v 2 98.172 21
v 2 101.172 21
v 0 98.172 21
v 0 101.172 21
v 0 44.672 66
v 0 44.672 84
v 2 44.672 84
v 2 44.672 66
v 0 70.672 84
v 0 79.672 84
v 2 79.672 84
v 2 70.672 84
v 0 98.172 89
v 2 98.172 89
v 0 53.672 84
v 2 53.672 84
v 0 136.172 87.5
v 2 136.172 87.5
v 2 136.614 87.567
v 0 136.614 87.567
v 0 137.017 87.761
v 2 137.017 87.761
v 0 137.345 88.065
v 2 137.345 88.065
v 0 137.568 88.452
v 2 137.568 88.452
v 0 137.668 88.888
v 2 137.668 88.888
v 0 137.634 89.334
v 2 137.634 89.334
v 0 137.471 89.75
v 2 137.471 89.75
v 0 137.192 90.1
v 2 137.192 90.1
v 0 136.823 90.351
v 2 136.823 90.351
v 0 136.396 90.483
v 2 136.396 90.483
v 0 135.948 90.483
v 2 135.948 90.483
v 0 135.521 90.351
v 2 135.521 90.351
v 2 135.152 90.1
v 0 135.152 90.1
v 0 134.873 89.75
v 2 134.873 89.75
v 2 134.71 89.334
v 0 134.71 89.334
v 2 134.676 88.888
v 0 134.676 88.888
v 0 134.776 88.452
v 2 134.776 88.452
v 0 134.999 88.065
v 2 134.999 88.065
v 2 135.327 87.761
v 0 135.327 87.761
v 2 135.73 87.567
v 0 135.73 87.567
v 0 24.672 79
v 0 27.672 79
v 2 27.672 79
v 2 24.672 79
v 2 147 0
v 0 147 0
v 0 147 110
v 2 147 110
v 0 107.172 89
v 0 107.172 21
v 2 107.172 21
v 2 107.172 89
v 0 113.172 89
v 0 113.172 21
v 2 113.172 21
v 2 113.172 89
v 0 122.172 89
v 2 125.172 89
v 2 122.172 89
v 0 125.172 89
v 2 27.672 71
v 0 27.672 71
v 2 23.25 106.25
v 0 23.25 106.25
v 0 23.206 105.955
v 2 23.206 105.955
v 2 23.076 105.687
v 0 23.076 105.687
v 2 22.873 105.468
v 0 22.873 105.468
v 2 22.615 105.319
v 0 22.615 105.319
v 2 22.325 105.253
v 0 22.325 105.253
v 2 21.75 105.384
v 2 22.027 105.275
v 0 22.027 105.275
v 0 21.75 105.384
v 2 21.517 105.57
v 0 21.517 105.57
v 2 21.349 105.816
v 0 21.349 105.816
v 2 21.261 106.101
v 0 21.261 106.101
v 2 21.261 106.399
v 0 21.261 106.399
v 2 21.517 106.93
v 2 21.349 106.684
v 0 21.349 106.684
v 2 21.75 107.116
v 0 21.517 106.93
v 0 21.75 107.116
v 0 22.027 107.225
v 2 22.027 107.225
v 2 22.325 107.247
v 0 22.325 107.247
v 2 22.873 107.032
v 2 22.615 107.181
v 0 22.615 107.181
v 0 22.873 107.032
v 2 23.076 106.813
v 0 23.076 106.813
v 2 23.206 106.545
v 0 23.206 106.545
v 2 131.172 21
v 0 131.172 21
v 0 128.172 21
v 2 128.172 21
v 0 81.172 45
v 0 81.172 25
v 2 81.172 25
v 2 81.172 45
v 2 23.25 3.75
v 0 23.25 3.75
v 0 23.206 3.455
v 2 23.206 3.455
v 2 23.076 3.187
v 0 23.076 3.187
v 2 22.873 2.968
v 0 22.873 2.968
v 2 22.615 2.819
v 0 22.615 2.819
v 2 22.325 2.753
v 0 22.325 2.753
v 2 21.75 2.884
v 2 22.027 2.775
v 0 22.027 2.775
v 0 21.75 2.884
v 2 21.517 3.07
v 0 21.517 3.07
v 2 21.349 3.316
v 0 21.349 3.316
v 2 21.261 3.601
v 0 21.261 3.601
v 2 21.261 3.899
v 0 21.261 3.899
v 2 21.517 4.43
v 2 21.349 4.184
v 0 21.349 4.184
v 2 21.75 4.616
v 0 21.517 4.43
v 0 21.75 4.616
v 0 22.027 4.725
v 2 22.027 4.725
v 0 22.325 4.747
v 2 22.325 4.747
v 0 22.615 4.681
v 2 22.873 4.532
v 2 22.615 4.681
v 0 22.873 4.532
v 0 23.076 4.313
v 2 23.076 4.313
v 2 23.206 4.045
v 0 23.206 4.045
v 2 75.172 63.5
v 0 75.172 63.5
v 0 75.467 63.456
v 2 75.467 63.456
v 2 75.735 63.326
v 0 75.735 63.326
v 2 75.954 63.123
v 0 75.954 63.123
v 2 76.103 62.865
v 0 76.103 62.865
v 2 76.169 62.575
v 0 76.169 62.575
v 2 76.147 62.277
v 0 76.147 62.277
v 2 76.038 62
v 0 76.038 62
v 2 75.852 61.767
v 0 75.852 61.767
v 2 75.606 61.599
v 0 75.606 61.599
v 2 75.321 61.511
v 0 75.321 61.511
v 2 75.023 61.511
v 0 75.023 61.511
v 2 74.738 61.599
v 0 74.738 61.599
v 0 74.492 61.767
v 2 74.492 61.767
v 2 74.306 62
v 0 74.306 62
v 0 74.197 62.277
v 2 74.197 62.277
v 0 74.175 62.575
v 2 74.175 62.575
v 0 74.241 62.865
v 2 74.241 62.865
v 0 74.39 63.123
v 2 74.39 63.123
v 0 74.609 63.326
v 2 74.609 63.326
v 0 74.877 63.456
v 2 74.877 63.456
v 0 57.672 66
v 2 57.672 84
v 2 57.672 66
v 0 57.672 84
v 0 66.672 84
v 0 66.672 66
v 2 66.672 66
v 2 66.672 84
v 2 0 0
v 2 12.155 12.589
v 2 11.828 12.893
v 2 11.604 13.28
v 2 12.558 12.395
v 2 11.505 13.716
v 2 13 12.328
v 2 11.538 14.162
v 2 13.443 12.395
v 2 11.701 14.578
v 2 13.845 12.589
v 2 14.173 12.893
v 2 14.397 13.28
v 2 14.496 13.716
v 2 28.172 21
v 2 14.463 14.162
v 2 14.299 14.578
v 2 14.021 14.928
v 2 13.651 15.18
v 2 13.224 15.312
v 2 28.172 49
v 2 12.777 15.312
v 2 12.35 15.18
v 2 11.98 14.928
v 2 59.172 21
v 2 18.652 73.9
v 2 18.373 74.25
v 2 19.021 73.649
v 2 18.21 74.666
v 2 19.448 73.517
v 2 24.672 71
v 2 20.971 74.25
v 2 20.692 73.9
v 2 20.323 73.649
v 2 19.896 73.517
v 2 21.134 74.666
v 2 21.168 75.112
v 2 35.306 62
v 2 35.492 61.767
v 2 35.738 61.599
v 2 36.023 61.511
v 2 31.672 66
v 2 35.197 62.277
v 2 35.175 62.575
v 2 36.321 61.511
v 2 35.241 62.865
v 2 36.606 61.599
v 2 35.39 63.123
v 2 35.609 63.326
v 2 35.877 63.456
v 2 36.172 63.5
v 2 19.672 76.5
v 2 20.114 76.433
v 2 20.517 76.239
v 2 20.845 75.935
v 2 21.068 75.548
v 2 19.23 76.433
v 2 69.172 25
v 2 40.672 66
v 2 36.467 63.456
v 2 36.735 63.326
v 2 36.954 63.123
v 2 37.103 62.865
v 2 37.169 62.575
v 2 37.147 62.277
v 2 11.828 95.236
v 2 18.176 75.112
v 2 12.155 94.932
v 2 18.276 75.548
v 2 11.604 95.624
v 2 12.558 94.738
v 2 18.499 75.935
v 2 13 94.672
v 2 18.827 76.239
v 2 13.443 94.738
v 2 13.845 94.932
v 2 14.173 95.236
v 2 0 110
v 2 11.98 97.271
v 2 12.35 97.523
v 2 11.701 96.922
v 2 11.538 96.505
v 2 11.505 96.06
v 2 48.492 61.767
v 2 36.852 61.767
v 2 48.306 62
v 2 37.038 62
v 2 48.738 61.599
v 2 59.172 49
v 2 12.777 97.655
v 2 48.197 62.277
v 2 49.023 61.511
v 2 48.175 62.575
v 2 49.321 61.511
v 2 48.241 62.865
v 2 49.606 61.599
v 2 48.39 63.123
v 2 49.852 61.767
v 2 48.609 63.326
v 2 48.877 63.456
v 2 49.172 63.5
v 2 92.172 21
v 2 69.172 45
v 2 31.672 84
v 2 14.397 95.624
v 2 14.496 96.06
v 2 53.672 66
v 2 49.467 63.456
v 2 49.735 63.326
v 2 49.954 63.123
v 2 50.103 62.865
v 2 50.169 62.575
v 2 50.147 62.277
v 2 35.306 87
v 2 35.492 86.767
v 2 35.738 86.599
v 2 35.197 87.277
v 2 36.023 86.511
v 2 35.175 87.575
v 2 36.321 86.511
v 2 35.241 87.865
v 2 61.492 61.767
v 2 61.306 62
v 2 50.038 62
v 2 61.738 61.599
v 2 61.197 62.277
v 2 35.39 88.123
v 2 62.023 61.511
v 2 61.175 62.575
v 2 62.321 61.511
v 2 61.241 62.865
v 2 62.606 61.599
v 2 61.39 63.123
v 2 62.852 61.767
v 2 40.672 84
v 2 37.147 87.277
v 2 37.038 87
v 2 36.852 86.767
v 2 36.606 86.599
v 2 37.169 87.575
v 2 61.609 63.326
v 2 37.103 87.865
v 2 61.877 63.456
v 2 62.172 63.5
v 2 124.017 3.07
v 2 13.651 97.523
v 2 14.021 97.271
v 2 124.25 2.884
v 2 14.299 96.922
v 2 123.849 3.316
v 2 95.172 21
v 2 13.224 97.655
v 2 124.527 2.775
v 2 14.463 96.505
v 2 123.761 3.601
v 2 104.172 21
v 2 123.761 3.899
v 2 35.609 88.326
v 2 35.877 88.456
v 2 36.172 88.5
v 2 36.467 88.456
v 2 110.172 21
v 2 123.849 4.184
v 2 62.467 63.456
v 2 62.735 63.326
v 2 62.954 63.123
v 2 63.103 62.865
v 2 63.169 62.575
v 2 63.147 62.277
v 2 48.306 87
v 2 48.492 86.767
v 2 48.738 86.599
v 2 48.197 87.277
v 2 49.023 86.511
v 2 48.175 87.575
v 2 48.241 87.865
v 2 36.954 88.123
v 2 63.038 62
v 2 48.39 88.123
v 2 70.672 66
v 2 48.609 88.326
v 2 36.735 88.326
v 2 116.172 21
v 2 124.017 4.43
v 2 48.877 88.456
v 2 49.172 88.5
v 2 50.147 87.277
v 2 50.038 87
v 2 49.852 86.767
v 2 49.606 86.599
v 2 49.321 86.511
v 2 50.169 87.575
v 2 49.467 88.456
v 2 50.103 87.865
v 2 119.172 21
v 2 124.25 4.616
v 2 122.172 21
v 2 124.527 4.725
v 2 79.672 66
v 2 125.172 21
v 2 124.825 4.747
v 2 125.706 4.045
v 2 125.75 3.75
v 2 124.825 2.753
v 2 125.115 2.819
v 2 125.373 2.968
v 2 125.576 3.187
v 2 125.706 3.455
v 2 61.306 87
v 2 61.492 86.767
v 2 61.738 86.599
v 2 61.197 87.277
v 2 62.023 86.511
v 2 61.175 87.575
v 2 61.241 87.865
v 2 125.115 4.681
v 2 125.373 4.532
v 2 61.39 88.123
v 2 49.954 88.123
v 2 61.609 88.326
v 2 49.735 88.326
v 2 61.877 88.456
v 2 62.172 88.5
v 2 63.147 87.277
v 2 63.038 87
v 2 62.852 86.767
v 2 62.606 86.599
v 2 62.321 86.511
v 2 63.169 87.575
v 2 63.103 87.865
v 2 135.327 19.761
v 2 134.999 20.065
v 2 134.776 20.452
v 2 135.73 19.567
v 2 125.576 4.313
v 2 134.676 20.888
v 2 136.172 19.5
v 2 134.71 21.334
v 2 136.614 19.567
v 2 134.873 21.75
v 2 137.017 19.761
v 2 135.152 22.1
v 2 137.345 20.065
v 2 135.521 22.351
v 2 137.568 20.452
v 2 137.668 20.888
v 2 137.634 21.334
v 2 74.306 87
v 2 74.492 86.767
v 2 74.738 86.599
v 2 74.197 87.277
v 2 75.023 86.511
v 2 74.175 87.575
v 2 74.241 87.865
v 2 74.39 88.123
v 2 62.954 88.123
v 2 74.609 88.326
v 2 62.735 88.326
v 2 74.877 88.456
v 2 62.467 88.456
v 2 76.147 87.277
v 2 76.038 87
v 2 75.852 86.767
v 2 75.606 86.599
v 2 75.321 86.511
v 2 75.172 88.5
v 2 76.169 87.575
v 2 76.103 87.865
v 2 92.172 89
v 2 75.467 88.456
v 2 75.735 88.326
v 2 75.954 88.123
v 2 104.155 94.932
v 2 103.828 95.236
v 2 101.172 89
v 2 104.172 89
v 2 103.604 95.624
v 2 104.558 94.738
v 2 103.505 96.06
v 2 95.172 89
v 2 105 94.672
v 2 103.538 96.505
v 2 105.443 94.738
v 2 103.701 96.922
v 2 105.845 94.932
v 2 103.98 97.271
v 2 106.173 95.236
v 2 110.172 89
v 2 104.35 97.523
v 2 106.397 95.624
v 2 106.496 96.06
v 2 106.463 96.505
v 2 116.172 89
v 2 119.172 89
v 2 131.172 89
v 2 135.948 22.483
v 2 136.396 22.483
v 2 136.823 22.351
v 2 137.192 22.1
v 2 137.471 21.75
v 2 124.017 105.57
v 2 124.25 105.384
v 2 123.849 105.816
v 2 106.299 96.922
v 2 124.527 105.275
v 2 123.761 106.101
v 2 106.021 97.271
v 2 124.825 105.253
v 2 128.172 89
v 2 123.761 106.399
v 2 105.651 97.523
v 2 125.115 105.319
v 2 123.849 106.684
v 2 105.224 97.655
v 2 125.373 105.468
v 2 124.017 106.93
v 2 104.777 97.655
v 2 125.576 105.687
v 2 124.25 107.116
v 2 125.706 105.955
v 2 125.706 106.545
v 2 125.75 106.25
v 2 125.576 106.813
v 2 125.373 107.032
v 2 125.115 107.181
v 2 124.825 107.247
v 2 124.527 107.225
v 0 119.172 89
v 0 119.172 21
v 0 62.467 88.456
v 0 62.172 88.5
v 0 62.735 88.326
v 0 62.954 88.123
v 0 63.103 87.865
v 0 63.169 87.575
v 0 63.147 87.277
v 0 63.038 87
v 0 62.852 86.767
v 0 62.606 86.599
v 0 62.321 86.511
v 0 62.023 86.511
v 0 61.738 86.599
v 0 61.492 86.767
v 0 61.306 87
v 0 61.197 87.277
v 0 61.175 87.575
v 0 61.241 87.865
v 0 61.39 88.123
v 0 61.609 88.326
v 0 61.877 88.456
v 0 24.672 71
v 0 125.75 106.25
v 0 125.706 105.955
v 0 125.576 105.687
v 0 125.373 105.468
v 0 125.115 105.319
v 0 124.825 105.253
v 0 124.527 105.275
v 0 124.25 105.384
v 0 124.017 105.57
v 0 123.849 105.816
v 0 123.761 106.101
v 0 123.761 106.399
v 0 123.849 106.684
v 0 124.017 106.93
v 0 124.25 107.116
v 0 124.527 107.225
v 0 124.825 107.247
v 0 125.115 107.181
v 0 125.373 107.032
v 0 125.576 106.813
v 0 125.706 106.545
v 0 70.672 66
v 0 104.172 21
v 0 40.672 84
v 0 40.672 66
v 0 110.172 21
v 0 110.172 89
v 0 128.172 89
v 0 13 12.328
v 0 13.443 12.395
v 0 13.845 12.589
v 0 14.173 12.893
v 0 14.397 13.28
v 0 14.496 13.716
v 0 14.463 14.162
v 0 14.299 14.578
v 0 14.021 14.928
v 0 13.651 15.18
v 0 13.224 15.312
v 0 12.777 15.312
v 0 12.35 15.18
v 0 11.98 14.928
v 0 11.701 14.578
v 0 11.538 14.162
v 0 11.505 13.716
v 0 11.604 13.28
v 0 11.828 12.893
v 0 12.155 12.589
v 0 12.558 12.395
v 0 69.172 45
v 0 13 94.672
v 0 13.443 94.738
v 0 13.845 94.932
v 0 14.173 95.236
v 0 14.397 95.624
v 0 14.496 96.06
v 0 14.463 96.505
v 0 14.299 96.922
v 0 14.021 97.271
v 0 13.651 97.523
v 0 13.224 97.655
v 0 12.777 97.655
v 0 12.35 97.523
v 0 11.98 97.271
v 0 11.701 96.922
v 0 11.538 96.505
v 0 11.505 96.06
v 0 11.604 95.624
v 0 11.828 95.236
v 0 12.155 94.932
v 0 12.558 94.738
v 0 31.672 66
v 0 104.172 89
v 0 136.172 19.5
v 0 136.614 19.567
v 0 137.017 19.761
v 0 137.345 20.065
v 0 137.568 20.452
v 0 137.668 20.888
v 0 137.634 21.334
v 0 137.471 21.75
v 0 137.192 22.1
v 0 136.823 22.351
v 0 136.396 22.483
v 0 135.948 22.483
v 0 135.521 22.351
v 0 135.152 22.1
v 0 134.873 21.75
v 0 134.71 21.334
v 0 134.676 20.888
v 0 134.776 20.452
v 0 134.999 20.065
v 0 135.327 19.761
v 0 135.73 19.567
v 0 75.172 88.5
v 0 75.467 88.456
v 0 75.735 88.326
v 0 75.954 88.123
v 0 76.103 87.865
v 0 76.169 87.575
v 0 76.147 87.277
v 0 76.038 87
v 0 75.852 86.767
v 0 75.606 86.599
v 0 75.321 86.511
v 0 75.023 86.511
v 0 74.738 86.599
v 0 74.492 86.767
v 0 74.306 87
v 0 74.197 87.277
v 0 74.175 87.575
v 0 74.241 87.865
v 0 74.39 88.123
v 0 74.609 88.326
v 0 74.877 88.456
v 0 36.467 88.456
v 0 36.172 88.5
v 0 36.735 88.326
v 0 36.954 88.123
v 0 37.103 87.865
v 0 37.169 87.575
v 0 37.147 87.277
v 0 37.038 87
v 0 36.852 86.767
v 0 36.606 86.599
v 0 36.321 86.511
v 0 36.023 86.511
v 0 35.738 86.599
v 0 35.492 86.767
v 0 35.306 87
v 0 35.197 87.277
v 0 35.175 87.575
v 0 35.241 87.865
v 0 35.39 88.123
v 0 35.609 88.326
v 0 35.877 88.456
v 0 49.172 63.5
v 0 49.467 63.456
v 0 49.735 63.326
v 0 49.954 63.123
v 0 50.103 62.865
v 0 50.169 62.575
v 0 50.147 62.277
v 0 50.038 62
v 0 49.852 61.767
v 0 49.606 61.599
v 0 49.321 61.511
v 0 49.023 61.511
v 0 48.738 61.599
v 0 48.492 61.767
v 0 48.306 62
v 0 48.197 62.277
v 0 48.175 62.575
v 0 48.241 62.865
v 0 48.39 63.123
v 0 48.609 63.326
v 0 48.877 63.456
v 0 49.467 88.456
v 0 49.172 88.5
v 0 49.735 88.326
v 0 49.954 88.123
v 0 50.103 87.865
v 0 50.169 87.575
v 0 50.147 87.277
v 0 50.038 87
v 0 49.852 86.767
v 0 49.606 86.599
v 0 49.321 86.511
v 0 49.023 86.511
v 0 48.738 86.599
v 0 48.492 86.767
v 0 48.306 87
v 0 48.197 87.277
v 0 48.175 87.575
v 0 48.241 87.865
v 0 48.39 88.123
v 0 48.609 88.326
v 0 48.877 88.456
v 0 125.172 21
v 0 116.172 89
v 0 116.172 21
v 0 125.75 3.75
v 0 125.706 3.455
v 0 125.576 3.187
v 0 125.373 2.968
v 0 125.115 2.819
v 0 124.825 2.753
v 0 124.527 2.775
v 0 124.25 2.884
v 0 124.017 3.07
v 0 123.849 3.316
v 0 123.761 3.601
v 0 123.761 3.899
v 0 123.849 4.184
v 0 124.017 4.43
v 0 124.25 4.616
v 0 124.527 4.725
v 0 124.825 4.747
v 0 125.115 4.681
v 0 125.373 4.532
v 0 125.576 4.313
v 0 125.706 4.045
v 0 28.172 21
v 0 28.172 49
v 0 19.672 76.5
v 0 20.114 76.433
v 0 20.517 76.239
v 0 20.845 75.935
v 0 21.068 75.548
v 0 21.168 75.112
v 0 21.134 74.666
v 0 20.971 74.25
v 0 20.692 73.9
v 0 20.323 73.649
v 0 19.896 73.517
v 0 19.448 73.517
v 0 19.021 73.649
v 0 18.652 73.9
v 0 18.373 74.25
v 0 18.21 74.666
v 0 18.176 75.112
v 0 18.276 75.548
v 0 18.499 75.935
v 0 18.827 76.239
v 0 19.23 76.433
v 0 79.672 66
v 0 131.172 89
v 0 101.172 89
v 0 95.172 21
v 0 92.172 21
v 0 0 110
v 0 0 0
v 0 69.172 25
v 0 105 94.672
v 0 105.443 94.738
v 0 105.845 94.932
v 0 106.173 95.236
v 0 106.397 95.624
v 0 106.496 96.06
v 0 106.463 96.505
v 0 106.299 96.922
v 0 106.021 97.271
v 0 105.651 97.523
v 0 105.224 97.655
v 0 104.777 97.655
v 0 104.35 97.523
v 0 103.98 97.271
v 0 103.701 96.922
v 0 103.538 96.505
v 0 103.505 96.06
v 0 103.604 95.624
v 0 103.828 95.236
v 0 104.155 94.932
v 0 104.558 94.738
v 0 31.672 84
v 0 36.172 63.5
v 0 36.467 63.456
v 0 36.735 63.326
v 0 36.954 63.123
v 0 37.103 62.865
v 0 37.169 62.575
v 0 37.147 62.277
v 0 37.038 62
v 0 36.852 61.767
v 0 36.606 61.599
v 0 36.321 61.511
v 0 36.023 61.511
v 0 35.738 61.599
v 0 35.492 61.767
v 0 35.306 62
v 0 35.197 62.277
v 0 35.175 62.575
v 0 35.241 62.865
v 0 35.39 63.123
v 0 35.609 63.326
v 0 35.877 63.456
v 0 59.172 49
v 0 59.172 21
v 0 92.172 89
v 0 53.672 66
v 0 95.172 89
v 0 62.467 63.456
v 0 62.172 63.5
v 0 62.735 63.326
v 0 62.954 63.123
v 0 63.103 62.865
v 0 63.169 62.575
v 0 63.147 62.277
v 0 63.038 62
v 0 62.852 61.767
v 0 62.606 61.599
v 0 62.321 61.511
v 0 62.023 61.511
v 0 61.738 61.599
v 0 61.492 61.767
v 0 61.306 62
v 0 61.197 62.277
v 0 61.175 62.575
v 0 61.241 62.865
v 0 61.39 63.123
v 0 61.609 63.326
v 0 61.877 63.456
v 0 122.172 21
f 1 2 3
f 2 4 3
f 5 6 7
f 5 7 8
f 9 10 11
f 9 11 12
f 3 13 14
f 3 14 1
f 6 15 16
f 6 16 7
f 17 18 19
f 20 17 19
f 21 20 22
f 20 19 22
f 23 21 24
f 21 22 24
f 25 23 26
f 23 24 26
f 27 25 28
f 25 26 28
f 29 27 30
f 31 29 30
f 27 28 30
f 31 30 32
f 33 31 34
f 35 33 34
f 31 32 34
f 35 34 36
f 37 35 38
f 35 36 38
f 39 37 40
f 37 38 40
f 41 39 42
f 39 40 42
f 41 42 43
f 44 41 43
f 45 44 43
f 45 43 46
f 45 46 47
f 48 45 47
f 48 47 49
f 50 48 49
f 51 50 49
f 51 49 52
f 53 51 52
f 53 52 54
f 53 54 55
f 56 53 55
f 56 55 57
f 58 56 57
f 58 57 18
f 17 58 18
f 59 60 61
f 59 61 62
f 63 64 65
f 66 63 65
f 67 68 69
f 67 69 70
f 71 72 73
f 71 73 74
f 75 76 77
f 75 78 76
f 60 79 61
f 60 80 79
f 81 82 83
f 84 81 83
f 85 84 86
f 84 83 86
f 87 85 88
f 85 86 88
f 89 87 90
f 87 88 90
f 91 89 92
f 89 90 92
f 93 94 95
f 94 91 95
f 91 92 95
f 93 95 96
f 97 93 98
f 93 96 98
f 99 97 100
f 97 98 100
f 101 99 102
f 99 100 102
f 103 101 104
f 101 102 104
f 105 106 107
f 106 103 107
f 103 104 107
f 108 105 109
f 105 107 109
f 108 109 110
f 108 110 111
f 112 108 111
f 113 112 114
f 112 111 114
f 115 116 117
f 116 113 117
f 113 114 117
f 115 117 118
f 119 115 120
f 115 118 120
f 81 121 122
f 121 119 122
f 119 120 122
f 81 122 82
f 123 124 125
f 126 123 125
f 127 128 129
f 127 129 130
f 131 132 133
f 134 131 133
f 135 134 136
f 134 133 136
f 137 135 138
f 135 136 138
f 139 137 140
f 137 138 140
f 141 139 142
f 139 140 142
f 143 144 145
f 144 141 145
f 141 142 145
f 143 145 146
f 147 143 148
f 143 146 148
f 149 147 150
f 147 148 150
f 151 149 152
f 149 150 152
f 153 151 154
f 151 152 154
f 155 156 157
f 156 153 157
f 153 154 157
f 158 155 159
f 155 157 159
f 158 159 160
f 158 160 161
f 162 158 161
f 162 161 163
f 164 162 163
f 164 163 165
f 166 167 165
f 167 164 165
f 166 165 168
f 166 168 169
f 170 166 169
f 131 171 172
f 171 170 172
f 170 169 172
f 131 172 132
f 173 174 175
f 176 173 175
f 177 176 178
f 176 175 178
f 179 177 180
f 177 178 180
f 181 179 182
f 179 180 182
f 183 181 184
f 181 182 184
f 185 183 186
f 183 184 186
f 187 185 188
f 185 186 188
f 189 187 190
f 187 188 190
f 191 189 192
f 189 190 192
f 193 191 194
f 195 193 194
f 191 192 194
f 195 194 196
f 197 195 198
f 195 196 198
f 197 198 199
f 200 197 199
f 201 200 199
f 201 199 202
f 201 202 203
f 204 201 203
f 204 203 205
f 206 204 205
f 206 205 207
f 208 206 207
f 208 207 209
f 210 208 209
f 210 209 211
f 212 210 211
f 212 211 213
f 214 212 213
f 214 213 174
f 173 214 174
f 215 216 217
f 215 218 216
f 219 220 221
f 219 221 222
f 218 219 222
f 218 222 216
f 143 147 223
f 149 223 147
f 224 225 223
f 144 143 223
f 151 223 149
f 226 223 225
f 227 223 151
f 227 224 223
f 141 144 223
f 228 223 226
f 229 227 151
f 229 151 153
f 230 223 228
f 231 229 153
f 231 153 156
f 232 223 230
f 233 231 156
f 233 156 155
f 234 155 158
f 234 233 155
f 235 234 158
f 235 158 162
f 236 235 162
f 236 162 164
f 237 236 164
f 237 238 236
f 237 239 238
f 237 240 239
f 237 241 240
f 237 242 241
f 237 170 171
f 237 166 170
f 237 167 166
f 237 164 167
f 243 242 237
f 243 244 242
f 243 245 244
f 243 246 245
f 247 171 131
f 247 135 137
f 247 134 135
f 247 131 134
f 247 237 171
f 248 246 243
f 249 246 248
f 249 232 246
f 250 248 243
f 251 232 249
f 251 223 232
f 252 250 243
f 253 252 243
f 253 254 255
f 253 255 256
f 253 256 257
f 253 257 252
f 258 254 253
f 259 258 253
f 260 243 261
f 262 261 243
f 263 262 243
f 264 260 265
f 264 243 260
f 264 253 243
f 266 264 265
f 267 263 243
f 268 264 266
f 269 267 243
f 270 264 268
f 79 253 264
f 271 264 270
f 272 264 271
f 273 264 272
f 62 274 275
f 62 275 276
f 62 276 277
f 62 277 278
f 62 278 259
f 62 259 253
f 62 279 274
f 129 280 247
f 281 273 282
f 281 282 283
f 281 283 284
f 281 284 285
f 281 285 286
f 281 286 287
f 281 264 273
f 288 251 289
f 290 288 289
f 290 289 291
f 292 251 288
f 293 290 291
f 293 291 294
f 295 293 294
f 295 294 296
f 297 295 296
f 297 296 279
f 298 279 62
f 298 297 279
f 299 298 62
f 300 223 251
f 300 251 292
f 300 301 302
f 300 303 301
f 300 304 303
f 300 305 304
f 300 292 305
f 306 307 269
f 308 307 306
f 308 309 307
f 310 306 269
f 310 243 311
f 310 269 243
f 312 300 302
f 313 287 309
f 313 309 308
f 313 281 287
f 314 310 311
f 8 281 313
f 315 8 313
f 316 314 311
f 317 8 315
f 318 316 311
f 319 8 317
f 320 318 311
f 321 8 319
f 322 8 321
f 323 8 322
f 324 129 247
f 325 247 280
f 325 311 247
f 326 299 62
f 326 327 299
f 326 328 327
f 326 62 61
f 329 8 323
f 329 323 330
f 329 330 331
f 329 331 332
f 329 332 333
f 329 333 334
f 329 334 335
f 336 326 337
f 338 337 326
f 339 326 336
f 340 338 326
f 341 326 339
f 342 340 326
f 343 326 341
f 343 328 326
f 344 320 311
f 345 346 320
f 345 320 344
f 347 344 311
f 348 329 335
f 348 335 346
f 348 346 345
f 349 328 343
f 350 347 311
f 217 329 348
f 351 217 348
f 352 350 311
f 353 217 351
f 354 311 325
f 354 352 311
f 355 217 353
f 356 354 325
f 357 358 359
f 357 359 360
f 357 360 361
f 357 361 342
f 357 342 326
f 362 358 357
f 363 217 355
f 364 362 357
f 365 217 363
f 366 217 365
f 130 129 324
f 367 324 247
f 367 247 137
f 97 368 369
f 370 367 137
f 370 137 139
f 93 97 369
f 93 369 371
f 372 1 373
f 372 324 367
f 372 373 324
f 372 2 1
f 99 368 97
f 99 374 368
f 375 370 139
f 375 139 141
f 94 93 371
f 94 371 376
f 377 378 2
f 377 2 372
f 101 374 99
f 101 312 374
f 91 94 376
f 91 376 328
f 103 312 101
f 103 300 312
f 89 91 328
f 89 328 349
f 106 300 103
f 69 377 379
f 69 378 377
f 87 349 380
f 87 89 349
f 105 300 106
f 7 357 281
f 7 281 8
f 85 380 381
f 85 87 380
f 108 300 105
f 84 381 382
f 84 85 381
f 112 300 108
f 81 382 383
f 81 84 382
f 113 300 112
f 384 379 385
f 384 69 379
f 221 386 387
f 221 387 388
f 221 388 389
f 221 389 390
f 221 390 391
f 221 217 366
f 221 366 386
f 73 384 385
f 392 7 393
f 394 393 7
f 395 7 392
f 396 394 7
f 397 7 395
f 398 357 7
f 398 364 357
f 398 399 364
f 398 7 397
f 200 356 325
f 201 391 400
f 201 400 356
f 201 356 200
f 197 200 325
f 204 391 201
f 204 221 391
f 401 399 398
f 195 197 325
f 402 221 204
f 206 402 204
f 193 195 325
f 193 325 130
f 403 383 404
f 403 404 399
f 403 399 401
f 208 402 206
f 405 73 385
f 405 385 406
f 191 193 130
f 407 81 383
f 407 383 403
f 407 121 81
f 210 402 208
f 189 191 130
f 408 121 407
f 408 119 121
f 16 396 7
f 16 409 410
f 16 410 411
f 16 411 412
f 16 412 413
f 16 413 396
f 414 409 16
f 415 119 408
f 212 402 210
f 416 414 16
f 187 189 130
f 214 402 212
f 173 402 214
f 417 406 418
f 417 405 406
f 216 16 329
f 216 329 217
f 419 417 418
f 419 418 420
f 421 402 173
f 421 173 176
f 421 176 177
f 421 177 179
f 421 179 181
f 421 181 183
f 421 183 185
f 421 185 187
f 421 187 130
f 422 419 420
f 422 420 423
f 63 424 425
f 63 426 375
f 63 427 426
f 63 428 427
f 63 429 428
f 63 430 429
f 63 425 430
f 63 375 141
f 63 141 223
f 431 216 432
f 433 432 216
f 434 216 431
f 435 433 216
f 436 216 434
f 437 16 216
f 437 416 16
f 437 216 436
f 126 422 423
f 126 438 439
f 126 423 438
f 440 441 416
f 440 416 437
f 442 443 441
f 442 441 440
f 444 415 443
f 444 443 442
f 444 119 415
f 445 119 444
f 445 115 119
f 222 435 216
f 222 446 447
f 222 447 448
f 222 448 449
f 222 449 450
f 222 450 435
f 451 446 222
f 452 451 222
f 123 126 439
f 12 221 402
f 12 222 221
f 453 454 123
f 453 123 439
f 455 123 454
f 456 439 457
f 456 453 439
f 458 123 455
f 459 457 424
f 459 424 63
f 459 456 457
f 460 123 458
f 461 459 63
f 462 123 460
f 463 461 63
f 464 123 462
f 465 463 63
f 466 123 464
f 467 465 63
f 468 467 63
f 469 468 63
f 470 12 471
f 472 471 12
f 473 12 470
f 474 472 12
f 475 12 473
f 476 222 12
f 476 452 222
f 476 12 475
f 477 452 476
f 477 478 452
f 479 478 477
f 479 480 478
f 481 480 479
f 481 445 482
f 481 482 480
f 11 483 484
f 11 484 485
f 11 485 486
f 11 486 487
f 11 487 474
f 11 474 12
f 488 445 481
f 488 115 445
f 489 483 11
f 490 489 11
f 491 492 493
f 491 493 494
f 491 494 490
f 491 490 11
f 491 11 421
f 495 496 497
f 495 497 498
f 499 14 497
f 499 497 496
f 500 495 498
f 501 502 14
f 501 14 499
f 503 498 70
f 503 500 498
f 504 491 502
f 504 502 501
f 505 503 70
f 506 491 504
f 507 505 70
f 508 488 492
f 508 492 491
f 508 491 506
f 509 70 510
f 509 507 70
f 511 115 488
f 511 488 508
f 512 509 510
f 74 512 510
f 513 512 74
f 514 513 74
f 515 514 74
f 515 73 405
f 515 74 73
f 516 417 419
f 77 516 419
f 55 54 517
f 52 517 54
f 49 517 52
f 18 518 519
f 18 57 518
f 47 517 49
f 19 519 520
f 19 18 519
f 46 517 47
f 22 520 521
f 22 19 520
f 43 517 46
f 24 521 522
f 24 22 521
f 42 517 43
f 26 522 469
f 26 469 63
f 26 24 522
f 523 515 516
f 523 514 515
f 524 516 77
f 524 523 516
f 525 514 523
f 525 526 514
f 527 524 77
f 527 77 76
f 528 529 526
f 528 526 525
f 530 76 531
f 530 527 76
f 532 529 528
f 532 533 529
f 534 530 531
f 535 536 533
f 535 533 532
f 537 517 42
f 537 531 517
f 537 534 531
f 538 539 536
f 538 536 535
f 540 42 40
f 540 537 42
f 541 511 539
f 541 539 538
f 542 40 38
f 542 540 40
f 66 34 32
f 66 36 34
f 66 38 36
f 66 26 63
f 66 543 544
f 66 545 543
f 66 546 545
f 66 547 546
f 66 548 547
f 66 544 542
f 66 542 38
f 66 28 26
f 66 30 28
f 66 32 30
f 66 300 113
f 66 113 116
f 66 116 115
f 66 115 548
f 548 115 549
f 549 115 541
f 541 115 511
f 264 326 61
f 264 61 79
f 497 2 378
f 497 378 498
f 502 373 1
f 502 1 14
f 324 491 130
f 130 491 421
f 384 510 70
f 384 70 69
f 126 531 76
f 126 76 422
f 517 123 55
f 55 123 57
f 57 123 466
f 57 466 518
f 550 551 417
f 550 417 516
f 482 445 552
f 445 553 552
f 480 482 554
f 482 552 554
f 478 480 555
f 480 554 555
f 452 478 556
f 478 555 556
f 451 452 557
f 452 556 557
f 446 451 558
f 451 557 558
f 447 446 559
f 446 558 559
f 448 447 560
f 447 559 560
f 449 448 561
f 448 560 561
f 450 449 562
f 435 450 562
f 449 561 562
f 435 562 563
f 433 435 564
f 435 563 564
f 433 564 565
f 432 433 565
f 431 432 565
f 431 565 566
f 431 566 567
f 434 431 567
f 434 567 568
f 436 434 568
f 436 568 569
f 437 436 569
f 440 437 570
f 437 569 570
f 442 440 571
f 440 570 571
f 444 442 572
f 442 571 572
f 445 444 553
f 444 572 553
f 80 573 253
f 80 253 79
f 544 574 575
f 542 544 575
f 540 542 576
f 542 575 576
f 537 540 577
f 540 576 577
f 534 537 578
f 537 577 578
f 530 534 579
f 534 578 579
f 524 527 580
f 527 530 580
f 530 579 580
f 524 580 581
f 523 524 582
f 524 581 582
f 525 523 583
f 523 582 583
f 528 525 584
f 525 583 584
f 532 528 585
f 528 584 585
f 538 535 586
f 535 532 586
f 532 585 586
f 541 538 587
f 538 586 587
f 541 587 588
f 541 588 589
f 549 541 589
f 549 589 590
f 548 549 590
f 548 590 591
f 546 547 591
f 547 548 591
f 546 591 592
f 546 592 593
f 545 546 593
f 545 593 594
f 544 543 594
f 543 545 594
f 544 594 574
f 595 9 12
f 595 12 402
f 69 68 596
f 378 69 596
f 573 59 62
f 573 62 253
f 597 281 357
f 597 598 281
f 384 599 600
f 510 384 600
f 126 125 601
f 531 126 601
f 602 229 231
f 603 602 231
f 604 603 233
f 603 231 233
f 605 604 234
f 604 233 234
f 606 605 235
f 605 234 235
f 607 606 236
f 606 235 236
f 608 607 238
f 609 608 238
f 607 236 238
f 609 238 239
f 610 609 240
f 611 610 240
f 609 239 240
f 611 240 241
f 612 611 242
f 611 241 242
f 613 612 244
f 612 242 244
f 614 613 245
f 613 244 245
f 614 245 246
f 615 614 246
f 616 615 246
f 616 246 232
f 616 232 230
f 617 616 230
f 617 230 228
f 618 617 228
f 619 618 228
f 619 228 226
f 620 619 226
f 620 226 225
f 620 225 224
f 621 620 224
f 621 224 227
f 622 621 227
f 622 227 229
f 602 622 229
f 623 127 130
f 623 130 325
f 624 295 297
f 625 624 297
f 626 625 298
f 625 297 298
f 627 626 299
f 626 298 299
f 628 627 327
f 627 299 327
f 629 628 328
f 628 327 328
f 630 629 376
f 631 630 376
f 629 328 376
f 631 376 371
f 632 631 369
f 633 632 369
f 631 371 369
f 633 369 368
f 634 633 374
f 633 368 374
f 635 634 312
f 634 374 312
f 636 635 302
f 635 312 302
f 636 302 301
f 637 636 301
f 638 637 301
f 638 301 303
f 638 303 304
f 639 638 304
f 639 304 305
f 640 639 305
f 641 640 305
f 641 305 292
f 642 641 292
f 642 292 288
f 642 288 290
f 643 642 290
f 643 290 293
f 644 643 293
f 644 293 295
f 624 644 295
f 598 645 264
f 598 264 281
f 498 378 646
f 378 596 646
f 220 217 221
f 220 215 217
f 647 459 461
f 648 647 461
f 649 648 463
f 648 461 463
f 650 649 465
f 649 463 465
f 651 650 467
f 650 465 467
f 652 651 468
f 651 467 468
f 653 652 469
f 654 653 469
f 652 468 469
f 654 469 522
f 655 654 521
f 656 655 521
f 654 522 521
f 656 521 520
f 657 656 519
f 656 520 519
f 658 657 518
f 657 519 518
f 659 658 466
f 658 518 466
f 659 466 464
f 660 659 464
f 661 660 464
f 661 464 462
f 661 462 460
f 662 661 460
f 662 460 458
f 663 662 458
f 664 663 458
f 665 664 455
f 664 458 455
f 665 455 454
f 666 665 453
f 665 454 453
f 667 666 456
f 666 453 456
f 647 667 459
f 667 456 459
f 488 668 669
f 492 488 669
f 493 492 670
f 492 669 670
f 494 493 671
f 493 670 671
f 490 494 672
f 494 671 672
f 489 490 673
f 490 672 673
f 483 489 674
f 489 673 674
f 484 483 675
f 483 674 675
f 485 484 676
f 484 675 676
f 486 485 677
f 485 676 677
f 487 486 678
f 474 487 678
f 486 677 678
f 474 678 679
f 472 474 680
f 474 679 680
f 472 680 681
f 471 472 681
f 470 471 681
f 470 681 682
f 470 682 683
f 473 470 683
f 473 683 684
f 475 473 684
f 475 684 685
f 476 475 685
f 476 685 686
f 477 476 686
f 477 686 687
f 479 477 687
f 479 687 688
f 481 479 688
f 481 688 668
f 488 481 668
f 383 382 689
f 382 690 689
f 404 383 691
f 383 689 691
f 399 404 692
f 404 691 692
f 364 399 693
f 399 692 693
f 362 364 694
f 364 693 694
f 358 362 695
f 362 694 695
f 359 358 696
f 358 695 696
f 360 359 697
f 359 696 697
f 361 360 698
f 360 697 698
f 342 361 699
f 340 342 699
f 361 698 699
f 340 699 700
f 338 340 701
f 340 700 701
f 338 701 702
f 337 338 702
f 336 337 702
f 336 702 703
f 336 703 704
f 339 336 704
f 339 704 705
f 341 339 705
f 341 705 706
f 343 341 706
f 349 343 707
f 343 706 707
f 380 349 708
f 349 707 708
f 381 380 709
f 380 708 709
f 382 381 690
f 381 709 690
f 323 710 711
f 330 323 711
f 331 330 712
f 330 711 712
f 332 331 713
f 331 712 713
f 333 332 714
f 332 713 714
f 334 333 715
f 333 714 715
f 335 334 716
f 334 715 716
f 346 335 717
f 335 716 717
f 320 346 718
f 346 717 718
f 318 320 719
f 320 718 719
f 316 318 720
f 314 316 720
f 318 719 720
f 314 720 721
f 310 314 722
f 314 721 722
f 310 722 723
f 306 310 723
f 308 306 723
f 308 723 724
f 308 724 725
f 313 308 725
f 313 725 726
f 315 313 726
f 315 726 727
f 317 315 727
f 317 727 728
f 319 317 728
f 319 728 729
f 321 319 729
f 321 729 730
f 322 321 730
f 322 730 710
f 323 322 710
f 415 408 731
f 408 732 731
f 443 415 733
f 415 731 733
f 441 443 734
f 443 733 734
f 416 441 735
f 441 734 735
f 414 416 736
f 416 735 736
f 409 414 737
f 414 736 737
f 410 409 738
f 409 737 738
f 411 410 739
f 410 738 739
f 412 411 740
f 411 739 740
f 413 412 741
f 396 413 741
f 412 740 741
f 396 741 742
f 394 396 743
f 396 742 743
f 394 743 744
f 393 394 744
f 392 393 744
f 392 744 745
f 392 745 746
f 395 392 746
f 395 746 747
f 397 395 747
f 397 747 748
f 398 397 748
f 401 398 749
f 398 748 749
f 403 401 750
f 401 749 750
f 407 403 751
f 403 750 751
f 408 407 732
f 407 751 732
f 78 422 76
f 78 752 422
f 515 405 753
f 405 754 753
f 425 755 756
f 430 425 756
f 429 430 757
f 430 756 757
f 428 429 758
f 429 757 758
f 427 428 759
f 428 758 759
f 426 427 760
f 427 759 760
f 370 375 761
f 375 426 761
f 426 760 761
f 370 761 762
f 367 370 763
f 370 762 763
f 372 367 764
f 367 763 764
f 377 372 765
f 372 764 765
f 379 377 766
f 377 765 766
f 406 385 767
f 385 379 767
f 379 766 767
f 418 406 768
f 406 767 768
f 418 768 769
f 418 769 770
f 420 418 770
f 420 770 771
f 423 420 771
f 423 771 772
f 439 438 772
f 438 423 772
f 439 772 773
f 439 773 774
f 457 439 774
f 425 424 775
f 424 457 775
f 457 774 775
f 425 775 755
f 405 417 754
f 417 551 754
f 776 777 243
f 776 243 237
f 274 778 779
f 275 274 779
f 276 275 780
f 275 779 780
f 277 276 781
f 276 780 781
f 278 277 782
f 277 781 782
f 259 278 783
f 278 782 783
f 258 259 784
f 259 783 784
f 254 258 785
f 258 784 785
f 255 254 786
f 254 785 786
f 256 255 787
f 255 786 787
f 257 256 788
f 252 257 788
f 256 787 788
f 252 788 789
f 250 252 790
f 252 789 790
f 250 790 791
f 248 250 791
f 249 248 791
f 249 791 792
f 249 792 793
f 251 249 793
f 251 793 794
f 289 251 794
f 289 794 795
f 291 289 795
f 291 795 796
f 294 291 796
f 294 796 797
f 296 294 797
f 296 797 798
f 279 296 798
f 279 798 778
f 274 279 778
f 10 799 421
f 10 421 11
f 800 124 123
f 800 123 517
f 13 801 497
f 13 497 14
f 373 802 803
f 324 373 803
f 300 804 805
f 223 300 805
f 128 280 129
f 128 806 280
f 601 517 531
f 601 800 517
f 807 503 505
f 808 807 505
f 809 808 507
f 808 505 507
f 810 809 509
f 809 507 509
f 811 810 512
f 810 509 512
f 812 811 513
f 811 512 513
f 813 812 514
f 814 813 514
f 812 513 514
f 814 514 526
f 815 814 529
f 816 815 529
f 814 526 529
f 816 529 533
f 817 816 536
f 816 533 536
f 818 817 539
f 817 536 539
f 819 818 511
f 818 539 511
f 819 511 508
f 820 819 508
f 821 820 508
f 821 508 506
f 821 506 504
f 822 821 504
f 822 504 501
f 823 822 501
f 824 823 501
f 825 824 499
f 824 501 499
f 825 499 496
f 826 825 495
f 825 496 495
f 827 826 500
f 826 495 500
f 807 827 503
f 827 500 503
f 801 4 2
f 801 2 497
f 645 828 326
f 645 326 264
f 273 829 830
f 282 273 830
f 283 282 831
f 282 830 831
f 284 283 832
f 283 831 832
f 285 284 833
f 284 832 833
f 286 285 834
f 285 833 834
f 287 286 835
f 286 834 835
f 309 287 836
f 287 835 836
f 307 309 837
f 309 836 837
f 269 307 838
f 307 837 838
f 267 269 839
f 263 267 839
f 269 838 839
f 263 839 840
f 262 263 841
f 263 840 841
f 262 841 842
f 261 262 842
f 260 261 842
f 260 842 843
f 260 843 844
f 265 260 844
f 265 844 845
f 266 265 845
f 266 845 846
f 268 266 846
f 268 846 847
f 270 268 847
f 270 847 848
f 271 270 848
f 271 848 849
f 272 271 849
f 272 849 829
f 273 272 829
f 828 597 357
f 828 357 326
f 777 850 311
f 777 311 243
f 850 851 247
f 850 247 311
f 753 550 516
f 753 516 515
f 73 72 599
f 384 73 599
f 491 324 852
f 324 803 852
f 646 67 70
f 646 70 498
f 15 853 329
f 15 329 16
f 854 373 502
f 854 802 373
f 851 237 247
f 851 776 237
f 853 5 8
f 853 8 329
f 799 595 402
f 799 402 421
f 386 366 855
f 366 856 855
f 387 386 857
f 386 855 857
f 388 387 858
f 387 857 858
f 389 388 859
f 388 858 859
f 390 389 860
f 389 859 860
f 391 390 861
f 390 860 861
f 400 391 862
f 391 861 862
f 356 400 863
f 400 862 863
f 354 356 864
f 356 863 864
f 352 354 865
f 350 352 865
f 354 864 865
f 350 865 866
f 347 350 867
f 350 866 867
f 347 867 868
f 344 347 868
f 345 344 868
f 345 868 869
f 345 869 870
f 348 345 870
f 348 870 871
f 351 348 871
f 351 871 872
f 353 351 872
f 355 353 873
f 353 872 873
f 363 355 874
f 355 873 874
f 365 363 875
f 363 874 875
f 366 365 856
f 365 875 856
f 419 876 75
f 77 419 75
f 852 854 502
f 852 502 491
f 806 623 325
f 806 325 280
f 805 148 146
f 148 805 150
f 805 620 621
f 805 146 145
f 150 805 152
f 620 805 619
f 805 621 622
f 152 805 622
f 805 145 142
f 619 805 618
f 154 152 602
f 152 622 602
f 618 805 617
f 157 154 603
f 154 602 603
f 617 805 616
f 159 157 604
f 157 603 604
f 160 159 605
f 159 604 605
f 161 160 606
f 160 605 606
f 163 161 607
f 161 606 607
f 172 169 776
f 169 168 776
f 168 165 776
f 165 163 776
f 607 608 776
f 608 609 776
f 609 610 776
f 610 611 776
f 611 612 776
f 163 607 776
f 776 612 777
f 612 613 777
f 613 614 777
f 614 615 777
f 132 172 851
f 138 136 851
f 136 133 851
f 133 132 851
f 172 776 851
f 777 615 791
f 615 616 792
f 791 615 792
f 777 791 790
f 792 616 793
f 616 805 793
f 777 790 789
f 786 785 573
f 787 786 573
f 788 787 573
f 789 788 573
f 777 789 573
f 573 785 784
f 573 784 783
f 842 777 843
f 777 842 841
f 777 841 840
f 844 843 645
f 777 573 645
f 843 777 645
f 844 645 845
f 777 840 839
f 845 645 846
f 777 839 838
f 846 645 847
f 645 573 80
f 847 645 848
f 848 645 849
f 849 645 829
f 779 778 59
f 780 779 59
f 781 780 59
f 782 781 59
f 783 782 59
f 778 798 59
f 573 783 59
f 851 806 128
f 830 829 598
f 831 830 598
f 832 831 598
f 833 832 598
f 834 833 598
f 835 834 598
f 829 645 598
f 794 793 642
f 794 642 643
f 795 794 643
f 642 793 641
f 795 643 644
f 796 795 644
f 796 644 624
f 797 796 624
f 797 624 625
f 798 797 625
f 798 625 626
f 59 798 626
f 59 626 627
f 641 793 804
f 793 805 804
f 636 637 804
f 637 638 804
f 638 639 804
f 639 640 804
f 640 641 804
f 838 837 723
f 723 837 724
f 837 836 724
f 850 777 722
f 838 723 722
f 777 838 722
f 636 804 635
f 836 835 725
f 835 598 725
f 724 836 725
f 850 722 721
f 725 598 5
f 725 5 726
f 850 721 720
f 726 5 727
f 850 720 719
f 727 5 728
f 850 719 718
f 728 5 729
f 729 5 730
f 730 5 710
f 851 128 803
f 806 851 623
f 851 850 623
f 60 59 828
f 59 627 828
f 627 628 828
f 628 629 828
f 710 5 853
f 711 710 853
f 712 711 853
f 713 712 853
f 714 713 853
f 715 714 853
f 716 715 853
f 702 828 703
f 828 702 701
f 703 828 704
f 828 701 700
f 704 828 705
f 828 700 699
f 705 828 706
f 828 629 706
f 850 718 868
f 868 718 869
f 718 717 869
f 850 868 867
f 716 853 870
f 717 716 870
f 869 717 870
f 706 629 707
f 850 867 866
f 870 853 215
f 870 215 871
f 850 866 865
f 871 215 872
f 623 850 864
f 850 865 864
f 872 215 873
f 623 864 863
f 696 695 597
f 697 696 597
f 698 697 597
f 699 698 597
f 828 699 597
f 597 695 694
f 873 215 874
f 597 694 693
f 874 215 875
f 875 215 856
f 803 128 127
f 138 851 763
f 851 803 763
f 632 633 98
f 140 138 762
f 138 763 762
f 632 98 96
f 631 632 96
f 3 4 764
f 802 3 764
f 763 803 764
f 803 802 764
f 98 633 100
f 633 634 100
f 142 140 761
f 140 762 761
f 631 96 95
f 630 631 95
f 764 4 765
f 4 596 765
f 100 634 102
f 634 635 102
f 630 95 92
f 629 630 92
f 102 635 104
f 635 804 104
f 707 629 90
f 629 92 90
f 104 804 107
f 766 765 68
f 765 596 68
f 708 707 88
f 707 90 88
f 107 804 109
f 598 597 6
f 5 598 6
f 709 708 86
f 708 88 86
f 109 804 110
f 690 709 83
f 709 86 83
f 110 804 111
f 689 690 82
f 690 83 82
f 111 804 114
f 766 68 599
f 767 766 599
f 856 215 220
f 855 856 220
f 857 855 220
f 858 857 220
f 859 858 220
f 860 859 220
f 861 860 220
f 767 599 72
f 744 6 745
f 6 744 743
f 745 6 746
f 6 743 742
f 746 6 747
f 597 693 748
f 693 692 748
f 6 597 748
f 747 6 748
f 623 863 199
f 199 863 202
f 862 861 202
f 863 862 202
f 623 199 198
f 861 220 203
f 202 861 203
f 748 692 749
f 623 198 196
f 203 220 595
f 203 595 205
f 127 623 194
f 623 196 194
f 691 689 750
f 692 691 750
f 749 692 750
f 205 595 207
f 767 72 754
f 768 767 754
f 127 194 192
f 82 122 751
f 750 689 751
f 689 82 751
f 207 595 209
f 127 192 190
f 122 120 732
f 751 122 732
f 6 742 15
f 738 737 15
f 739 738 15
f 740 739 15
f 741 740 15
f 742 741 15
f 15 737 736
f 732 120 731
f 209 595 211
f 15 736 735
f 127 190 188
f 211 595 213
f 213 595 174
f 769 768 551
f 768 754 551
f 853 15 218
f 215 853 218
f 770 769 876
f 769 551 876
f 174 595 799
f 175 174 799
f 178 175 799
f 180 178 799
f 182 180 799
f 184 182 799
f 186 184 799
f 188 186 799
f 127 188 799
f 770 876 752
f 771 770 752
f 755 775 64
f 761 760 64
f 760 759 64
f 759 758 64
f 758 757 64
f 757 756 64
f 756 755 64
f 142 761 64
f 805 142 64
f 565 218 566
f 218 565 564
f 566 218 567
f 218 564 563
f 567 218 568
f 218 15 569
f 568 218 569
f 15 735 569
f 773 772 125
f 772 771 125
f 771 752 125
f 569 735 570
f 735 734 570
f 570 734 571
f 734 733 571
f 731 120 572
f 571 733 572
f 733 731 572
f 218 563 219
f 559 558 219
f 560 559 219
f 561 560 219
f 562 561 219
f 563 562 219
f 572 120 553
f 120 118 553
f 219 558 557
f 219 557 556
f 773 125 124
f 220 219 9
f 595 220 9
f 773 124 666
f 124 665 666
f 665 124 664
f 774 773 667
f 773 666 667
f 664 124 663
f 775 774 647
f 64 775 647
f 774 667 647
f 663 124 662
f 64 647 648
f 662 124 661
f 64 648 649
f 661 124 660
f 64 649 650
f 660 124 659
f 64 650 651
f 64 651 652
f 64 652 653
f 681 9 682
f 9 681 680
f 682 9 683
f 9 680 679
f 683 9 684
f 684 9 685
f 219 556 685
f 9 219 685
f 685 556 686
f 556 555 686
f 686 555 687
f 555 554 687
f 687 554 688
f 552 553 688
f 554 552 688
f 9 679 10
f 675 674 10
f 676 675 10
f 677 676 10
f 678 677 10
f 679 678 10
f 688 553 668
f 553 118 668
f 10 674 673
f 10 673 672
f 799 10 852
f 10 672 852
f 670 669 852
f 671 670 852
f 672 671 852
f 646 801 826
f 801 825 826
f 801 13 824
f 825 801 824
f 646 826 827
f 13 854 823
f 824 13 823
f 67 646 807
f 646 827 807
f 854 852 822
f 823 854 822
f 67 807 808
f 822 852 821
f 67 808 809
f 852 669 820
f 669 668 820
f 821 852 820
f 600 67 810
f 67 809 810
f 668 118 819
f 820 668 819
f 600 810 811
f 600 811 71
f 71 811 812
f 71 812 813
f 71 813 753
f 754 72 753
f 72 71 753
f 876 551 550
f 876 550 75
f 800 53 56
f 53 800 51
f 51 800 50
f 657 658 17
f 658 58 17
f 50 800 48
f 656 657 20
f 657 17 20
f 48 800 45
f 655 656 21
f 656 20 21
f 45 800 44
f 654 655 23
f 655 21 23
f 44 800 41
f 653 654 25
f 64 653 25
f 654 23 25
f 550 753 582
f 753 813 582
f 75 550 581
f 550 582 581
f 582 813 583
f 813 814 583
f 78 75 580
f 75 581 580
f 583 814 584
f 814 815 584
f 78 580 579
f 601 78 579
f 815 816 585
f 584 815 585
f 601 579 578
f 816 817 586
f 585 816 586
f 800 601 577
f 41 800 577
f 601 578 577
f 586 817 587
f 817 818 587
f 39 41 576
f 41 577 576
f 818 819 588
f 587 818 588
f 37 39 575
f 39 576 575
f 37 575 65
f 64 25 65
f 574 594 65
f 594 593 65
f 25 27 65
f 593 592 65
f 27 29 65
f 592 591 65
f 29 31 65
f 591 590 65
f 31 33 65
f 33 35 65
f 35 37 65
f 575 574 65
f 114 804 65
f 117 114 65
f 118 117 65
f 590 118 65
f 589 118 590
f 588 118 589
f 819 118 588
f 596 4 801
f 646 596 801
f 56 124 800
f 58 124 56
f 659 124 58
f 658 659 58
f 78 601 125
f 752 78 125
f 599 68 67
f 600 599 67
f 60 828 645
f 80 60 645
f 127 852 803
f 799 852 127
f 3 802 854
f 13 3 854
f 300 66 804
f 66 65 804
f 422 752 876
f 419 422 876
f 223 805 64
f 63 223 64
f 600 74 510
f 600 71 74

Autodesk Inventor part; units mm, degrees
ref_plane "YZ Plane" through (0, 0, 0) normal (1, 0, 0) x (0, 1, 0)
ref_plane "XZ Plane" through (0, 0, 0) normal (0, 1, 0) x (-1, 0, 0)
ref_plane "XY Plane" through (0, 0, 0) normal (0, 0, 1) x (1, 0, 0)
sketch "Sketch1" plane through (0, 0, 0) normal (1, 0, 0) x (0, 1, 0)
  line L0 (0, 0) -> (147, 0)
  line L1 (147, 0) -> (147, 110)
  line L2 (147, 110) -> (0, 110)
  line L3 (0, 110) -> (0, 0)
  circle A0 centre (124.75, 106.25) radius 1
  circle A1 centre (124.75, 3.75) radius 1
  circle A2 centre (22.25, 3.75) radius 1
  circle A3 centre (22.25, 106.25) radius 1
  dimension "d0" = 102.5
  dimension "d1" = 102.5
  dimension "d2" = 2
  dimension "d3" = 110
  dimension "d4" = 147
  dimension "d5" = 22.25
  dimension "d6" = 22.25
  dimension "d7" = 3.75
  dimension "d8" = 3.75
extrude "Extrusion1" add sketch "Sketch1" along normal blind 2
sketch "Sketch5" plane through (2, 0, 0) normal (1, 0, 0) x (0, 0, -1)
  line L0 (0, 0) -> (0, 147) projected
  line L1 (-110, 147) -> (-110, 0) projected
  circle A0 centre (-13.8284, 13.0004) radius 1.5
  circle A1 centre (-96.1716, 13.0004) radius 1.5
  circle A2 centre (-89, 136.172) radius 1.5
  circle A3 centre (-96.1716, 105.0004) radius 1.5
  circle A4 centre (-21, 136.172) radius 1.5
  line L2 (-110, 0) -> (0, 0) projected
  line L3 (0, 147) -> (-110, 147) projected
  dimension "d94" = 3
  dimension "d116" = 21
  dimension "d117" = 68
  dimension "d118" = 82.3431
  dimension "d119" = 123.1716
  dimension "d120" = 7.1716
  dimension "d121" = 92
  dimension "d122" = 10.828
extrude "Extrusion4" cut sketch "Sketch5" against normal through all contours A0 | A1 | A2 | A3 | A4
sketch "Sketch7" plane through (0, 0, 0) normal (-1, 0, 0) x (0, 0, 1)
  line L0 (21, 59.172) -> (49, 59.172)
  line L1 (49, 59.172) -> (49, 28.172)
  line L2 (49, 28.172) -> (21, 28.172)
  line L3 (21, 28.172) -> (21, 59.172)
  line L4 (71, 27.672) -> (79, 27.672)
  line L5 (79, 27.672) -> (79, 24.672)
  line L6 (79, 24.672) -> (71, 24.672)
  line L7 (71, 24.672) -> (71, 27.672)
  line L8 (66, 66.672) -> (84, 66.672)
  line L9 (84, 66.672) -> (84, 57.672)
  line L10 (84, 57.672) -> (66, 57.672)
  line L11 (66, 57.672) -> (66, 66.672)
  line L12 (25, 81.172) -> (45, 81.172)
  line L13 (45, 81.172) -> (45, 69.172)
  line L14 (45, 69.172) -> (25, 69.172)
  line L15 (25, 69.172) -> (25, 81.172)
  circle A0 centre (75, 19.672) radius 1.5
  circle A1 centre (62.5, 62.172) radius 1
  circle A2 centre (87.5, 62.172) radius 1
  line L16 (21, 131.172) -> (89, 131.172)
  line L17 (21, 128.172) -> (89, 128.172)
  line L18 (21, 125.172) -> (89, 125.172)
  line L19 (21, 122.172) -> (89, 122.172)
  line L20 (21, 119.172) -> (89, 119.172)
  line L21 (21, 131.172) -> (21, 89.172)
  line L22 (89, 131.172) -> (89, 89.172)
  line L23 (21, 116.172) -> (89, 116.172)
  line L24 (21, 113.172) -> (89, 113.172)
  line L25 (21, 110.172) -> (89, 110.172)
  line L26 (21, 107.172) -> (89, 107.172)
  line L27 (21, 104.172) -> (89, 104.172)
  line L28 (21, 89.172) -> (89, 89.172)
  circle A3 centre (21, 136.172) radius 1.5 construction
  circle A4 centre (21, 136.172) radius 1.5 projected
  circle A5 centre (89, 136.172) radius 1.5 construction
  circle A6 centre (89, 136.172) radius 1.5 projected
  line L29 (110, 147) -> (110, 0) projected
  line L30 (0, 0) -> (0, 147) projected
  line L31 (21, 101.172) -> (89, 101.172)
  line L32 (89, 98.172) -> (21, 98.172)
  line L33 (21, 95.172) -> (89, 95.172)
  line L34 (21, 92.172) -> (89, 92.172)
  line L35 (66, 79.672) -> (84, 79.672)
  line L36 (84, 79.672) -> (84, 70.672)
  line L37 (84, 70.672) -> (66, 70.672)
  line L38 (66, 70.672) -> (66, 79.672)
  circle A7 centre (62.5, 75.172) radius 1
  circle A8 centre (87.5, 75.172) radius 1
  line L39 (66, 53.672) -> (84, 53.672)
  line L40 (84, 53.672) -> (84, 44.672)
  line L41 (84, 44.672) -> (66, 44.672)
  line L42 (66, 44.672) -> (66, 53.672)
  circle A9 centre (62.5, 49.172) radius 1
  circle A10 centre (87.5, 49.172) radius 1
  line L43 (66, 40.672) -> (84, 40.672)
  line L44 (84, 40.672) -> (84, 31.672)
  line L45 (84, 31.672) -> (66, 31.672)
  line L46 (66, 31.672) -> (66, 40.672)
  circle A11 centre (62.5, 36.172) radius 1
  circle A12 centre (87.5, 36.172) radius 1
  point P0 (35, 69.172)
  point P1 (35, 59.172)
  point P2 (75, 57.672)
  point P3 (75, 27.672)
  point P4 (75, 24.672)
  point P5 (66, 62.172)
  point P6 (84, 62.172)
  point P7 (66, 75.172)
  point P8 (45, 75.172)
  point P9 (66, 49.172)
  point P10 (84, 36.172)
  point P11 (66, 36.172)
  dimension "d105" = 8
  dimension "d106" = 3
  dimension "d107" = 18
  dimension "d108" = 9
  dimension "d109" = 28
  dimension "d110" = 31
  dimension "d111" = 20
  dimension "d112" = 12
  dimension "d123" = 3
  dimension "d124" = 5
  dimension "d125" = 25
  dimension "d126" = 12.5
  dimension "d127" = 2
  dimension "d129" = 3
  dimension "d130" = 3
  dimension "d131" = 3
  dimension "d133" = 3
  dimension "d134" = 3
  dimension "d135" = 3
  dimension "d136" = 3
  dimension "d137" = 3
  dimension "d138" = 3
  dimension "d140" = 5
  dimension "d141" = 40
  dimension "d142" = 35
  dimension "d143" = 35
  dimension "d144" = 10
  dimension "d150" = 3
  dimension "d151" = 3
  dimension "d152" = 3
  dimension "d154" = 3
  dimension "d155" = 3
  dimension "d156" = 8
  dimension "d158" = 4
  dimension "d159" = 4
  dimension "d161" = 4
  dimension "d162" = 4
extrude "Extrusion5" cut sketch "Sketch7" against normal through all contours L0 L1 L2 L3 | L4 L5 L6 L7 | L8 L9 L10 L11 | L12 L13 L14 L15 | A0 | A1 | A2 | L16 L22 L17 L21 | L18 L22 L19 L21 | L20 L22 L23 L21 | L24 L22 L25 L21 | L26 L22 L27 L21 | L31 L22 L32 L21 | L33 L22 L34 L21 | L35 L36 L37 L38 | A7 | A8 | L39 L40 L41 L42 | A9 | A10 | L43 L44 L45 L46 | A11 | A12
equation "\"d1\" = d0"
equation "\"d5\" = d6"
equation "\"d7\" = d8"
properties part number "front plate"
